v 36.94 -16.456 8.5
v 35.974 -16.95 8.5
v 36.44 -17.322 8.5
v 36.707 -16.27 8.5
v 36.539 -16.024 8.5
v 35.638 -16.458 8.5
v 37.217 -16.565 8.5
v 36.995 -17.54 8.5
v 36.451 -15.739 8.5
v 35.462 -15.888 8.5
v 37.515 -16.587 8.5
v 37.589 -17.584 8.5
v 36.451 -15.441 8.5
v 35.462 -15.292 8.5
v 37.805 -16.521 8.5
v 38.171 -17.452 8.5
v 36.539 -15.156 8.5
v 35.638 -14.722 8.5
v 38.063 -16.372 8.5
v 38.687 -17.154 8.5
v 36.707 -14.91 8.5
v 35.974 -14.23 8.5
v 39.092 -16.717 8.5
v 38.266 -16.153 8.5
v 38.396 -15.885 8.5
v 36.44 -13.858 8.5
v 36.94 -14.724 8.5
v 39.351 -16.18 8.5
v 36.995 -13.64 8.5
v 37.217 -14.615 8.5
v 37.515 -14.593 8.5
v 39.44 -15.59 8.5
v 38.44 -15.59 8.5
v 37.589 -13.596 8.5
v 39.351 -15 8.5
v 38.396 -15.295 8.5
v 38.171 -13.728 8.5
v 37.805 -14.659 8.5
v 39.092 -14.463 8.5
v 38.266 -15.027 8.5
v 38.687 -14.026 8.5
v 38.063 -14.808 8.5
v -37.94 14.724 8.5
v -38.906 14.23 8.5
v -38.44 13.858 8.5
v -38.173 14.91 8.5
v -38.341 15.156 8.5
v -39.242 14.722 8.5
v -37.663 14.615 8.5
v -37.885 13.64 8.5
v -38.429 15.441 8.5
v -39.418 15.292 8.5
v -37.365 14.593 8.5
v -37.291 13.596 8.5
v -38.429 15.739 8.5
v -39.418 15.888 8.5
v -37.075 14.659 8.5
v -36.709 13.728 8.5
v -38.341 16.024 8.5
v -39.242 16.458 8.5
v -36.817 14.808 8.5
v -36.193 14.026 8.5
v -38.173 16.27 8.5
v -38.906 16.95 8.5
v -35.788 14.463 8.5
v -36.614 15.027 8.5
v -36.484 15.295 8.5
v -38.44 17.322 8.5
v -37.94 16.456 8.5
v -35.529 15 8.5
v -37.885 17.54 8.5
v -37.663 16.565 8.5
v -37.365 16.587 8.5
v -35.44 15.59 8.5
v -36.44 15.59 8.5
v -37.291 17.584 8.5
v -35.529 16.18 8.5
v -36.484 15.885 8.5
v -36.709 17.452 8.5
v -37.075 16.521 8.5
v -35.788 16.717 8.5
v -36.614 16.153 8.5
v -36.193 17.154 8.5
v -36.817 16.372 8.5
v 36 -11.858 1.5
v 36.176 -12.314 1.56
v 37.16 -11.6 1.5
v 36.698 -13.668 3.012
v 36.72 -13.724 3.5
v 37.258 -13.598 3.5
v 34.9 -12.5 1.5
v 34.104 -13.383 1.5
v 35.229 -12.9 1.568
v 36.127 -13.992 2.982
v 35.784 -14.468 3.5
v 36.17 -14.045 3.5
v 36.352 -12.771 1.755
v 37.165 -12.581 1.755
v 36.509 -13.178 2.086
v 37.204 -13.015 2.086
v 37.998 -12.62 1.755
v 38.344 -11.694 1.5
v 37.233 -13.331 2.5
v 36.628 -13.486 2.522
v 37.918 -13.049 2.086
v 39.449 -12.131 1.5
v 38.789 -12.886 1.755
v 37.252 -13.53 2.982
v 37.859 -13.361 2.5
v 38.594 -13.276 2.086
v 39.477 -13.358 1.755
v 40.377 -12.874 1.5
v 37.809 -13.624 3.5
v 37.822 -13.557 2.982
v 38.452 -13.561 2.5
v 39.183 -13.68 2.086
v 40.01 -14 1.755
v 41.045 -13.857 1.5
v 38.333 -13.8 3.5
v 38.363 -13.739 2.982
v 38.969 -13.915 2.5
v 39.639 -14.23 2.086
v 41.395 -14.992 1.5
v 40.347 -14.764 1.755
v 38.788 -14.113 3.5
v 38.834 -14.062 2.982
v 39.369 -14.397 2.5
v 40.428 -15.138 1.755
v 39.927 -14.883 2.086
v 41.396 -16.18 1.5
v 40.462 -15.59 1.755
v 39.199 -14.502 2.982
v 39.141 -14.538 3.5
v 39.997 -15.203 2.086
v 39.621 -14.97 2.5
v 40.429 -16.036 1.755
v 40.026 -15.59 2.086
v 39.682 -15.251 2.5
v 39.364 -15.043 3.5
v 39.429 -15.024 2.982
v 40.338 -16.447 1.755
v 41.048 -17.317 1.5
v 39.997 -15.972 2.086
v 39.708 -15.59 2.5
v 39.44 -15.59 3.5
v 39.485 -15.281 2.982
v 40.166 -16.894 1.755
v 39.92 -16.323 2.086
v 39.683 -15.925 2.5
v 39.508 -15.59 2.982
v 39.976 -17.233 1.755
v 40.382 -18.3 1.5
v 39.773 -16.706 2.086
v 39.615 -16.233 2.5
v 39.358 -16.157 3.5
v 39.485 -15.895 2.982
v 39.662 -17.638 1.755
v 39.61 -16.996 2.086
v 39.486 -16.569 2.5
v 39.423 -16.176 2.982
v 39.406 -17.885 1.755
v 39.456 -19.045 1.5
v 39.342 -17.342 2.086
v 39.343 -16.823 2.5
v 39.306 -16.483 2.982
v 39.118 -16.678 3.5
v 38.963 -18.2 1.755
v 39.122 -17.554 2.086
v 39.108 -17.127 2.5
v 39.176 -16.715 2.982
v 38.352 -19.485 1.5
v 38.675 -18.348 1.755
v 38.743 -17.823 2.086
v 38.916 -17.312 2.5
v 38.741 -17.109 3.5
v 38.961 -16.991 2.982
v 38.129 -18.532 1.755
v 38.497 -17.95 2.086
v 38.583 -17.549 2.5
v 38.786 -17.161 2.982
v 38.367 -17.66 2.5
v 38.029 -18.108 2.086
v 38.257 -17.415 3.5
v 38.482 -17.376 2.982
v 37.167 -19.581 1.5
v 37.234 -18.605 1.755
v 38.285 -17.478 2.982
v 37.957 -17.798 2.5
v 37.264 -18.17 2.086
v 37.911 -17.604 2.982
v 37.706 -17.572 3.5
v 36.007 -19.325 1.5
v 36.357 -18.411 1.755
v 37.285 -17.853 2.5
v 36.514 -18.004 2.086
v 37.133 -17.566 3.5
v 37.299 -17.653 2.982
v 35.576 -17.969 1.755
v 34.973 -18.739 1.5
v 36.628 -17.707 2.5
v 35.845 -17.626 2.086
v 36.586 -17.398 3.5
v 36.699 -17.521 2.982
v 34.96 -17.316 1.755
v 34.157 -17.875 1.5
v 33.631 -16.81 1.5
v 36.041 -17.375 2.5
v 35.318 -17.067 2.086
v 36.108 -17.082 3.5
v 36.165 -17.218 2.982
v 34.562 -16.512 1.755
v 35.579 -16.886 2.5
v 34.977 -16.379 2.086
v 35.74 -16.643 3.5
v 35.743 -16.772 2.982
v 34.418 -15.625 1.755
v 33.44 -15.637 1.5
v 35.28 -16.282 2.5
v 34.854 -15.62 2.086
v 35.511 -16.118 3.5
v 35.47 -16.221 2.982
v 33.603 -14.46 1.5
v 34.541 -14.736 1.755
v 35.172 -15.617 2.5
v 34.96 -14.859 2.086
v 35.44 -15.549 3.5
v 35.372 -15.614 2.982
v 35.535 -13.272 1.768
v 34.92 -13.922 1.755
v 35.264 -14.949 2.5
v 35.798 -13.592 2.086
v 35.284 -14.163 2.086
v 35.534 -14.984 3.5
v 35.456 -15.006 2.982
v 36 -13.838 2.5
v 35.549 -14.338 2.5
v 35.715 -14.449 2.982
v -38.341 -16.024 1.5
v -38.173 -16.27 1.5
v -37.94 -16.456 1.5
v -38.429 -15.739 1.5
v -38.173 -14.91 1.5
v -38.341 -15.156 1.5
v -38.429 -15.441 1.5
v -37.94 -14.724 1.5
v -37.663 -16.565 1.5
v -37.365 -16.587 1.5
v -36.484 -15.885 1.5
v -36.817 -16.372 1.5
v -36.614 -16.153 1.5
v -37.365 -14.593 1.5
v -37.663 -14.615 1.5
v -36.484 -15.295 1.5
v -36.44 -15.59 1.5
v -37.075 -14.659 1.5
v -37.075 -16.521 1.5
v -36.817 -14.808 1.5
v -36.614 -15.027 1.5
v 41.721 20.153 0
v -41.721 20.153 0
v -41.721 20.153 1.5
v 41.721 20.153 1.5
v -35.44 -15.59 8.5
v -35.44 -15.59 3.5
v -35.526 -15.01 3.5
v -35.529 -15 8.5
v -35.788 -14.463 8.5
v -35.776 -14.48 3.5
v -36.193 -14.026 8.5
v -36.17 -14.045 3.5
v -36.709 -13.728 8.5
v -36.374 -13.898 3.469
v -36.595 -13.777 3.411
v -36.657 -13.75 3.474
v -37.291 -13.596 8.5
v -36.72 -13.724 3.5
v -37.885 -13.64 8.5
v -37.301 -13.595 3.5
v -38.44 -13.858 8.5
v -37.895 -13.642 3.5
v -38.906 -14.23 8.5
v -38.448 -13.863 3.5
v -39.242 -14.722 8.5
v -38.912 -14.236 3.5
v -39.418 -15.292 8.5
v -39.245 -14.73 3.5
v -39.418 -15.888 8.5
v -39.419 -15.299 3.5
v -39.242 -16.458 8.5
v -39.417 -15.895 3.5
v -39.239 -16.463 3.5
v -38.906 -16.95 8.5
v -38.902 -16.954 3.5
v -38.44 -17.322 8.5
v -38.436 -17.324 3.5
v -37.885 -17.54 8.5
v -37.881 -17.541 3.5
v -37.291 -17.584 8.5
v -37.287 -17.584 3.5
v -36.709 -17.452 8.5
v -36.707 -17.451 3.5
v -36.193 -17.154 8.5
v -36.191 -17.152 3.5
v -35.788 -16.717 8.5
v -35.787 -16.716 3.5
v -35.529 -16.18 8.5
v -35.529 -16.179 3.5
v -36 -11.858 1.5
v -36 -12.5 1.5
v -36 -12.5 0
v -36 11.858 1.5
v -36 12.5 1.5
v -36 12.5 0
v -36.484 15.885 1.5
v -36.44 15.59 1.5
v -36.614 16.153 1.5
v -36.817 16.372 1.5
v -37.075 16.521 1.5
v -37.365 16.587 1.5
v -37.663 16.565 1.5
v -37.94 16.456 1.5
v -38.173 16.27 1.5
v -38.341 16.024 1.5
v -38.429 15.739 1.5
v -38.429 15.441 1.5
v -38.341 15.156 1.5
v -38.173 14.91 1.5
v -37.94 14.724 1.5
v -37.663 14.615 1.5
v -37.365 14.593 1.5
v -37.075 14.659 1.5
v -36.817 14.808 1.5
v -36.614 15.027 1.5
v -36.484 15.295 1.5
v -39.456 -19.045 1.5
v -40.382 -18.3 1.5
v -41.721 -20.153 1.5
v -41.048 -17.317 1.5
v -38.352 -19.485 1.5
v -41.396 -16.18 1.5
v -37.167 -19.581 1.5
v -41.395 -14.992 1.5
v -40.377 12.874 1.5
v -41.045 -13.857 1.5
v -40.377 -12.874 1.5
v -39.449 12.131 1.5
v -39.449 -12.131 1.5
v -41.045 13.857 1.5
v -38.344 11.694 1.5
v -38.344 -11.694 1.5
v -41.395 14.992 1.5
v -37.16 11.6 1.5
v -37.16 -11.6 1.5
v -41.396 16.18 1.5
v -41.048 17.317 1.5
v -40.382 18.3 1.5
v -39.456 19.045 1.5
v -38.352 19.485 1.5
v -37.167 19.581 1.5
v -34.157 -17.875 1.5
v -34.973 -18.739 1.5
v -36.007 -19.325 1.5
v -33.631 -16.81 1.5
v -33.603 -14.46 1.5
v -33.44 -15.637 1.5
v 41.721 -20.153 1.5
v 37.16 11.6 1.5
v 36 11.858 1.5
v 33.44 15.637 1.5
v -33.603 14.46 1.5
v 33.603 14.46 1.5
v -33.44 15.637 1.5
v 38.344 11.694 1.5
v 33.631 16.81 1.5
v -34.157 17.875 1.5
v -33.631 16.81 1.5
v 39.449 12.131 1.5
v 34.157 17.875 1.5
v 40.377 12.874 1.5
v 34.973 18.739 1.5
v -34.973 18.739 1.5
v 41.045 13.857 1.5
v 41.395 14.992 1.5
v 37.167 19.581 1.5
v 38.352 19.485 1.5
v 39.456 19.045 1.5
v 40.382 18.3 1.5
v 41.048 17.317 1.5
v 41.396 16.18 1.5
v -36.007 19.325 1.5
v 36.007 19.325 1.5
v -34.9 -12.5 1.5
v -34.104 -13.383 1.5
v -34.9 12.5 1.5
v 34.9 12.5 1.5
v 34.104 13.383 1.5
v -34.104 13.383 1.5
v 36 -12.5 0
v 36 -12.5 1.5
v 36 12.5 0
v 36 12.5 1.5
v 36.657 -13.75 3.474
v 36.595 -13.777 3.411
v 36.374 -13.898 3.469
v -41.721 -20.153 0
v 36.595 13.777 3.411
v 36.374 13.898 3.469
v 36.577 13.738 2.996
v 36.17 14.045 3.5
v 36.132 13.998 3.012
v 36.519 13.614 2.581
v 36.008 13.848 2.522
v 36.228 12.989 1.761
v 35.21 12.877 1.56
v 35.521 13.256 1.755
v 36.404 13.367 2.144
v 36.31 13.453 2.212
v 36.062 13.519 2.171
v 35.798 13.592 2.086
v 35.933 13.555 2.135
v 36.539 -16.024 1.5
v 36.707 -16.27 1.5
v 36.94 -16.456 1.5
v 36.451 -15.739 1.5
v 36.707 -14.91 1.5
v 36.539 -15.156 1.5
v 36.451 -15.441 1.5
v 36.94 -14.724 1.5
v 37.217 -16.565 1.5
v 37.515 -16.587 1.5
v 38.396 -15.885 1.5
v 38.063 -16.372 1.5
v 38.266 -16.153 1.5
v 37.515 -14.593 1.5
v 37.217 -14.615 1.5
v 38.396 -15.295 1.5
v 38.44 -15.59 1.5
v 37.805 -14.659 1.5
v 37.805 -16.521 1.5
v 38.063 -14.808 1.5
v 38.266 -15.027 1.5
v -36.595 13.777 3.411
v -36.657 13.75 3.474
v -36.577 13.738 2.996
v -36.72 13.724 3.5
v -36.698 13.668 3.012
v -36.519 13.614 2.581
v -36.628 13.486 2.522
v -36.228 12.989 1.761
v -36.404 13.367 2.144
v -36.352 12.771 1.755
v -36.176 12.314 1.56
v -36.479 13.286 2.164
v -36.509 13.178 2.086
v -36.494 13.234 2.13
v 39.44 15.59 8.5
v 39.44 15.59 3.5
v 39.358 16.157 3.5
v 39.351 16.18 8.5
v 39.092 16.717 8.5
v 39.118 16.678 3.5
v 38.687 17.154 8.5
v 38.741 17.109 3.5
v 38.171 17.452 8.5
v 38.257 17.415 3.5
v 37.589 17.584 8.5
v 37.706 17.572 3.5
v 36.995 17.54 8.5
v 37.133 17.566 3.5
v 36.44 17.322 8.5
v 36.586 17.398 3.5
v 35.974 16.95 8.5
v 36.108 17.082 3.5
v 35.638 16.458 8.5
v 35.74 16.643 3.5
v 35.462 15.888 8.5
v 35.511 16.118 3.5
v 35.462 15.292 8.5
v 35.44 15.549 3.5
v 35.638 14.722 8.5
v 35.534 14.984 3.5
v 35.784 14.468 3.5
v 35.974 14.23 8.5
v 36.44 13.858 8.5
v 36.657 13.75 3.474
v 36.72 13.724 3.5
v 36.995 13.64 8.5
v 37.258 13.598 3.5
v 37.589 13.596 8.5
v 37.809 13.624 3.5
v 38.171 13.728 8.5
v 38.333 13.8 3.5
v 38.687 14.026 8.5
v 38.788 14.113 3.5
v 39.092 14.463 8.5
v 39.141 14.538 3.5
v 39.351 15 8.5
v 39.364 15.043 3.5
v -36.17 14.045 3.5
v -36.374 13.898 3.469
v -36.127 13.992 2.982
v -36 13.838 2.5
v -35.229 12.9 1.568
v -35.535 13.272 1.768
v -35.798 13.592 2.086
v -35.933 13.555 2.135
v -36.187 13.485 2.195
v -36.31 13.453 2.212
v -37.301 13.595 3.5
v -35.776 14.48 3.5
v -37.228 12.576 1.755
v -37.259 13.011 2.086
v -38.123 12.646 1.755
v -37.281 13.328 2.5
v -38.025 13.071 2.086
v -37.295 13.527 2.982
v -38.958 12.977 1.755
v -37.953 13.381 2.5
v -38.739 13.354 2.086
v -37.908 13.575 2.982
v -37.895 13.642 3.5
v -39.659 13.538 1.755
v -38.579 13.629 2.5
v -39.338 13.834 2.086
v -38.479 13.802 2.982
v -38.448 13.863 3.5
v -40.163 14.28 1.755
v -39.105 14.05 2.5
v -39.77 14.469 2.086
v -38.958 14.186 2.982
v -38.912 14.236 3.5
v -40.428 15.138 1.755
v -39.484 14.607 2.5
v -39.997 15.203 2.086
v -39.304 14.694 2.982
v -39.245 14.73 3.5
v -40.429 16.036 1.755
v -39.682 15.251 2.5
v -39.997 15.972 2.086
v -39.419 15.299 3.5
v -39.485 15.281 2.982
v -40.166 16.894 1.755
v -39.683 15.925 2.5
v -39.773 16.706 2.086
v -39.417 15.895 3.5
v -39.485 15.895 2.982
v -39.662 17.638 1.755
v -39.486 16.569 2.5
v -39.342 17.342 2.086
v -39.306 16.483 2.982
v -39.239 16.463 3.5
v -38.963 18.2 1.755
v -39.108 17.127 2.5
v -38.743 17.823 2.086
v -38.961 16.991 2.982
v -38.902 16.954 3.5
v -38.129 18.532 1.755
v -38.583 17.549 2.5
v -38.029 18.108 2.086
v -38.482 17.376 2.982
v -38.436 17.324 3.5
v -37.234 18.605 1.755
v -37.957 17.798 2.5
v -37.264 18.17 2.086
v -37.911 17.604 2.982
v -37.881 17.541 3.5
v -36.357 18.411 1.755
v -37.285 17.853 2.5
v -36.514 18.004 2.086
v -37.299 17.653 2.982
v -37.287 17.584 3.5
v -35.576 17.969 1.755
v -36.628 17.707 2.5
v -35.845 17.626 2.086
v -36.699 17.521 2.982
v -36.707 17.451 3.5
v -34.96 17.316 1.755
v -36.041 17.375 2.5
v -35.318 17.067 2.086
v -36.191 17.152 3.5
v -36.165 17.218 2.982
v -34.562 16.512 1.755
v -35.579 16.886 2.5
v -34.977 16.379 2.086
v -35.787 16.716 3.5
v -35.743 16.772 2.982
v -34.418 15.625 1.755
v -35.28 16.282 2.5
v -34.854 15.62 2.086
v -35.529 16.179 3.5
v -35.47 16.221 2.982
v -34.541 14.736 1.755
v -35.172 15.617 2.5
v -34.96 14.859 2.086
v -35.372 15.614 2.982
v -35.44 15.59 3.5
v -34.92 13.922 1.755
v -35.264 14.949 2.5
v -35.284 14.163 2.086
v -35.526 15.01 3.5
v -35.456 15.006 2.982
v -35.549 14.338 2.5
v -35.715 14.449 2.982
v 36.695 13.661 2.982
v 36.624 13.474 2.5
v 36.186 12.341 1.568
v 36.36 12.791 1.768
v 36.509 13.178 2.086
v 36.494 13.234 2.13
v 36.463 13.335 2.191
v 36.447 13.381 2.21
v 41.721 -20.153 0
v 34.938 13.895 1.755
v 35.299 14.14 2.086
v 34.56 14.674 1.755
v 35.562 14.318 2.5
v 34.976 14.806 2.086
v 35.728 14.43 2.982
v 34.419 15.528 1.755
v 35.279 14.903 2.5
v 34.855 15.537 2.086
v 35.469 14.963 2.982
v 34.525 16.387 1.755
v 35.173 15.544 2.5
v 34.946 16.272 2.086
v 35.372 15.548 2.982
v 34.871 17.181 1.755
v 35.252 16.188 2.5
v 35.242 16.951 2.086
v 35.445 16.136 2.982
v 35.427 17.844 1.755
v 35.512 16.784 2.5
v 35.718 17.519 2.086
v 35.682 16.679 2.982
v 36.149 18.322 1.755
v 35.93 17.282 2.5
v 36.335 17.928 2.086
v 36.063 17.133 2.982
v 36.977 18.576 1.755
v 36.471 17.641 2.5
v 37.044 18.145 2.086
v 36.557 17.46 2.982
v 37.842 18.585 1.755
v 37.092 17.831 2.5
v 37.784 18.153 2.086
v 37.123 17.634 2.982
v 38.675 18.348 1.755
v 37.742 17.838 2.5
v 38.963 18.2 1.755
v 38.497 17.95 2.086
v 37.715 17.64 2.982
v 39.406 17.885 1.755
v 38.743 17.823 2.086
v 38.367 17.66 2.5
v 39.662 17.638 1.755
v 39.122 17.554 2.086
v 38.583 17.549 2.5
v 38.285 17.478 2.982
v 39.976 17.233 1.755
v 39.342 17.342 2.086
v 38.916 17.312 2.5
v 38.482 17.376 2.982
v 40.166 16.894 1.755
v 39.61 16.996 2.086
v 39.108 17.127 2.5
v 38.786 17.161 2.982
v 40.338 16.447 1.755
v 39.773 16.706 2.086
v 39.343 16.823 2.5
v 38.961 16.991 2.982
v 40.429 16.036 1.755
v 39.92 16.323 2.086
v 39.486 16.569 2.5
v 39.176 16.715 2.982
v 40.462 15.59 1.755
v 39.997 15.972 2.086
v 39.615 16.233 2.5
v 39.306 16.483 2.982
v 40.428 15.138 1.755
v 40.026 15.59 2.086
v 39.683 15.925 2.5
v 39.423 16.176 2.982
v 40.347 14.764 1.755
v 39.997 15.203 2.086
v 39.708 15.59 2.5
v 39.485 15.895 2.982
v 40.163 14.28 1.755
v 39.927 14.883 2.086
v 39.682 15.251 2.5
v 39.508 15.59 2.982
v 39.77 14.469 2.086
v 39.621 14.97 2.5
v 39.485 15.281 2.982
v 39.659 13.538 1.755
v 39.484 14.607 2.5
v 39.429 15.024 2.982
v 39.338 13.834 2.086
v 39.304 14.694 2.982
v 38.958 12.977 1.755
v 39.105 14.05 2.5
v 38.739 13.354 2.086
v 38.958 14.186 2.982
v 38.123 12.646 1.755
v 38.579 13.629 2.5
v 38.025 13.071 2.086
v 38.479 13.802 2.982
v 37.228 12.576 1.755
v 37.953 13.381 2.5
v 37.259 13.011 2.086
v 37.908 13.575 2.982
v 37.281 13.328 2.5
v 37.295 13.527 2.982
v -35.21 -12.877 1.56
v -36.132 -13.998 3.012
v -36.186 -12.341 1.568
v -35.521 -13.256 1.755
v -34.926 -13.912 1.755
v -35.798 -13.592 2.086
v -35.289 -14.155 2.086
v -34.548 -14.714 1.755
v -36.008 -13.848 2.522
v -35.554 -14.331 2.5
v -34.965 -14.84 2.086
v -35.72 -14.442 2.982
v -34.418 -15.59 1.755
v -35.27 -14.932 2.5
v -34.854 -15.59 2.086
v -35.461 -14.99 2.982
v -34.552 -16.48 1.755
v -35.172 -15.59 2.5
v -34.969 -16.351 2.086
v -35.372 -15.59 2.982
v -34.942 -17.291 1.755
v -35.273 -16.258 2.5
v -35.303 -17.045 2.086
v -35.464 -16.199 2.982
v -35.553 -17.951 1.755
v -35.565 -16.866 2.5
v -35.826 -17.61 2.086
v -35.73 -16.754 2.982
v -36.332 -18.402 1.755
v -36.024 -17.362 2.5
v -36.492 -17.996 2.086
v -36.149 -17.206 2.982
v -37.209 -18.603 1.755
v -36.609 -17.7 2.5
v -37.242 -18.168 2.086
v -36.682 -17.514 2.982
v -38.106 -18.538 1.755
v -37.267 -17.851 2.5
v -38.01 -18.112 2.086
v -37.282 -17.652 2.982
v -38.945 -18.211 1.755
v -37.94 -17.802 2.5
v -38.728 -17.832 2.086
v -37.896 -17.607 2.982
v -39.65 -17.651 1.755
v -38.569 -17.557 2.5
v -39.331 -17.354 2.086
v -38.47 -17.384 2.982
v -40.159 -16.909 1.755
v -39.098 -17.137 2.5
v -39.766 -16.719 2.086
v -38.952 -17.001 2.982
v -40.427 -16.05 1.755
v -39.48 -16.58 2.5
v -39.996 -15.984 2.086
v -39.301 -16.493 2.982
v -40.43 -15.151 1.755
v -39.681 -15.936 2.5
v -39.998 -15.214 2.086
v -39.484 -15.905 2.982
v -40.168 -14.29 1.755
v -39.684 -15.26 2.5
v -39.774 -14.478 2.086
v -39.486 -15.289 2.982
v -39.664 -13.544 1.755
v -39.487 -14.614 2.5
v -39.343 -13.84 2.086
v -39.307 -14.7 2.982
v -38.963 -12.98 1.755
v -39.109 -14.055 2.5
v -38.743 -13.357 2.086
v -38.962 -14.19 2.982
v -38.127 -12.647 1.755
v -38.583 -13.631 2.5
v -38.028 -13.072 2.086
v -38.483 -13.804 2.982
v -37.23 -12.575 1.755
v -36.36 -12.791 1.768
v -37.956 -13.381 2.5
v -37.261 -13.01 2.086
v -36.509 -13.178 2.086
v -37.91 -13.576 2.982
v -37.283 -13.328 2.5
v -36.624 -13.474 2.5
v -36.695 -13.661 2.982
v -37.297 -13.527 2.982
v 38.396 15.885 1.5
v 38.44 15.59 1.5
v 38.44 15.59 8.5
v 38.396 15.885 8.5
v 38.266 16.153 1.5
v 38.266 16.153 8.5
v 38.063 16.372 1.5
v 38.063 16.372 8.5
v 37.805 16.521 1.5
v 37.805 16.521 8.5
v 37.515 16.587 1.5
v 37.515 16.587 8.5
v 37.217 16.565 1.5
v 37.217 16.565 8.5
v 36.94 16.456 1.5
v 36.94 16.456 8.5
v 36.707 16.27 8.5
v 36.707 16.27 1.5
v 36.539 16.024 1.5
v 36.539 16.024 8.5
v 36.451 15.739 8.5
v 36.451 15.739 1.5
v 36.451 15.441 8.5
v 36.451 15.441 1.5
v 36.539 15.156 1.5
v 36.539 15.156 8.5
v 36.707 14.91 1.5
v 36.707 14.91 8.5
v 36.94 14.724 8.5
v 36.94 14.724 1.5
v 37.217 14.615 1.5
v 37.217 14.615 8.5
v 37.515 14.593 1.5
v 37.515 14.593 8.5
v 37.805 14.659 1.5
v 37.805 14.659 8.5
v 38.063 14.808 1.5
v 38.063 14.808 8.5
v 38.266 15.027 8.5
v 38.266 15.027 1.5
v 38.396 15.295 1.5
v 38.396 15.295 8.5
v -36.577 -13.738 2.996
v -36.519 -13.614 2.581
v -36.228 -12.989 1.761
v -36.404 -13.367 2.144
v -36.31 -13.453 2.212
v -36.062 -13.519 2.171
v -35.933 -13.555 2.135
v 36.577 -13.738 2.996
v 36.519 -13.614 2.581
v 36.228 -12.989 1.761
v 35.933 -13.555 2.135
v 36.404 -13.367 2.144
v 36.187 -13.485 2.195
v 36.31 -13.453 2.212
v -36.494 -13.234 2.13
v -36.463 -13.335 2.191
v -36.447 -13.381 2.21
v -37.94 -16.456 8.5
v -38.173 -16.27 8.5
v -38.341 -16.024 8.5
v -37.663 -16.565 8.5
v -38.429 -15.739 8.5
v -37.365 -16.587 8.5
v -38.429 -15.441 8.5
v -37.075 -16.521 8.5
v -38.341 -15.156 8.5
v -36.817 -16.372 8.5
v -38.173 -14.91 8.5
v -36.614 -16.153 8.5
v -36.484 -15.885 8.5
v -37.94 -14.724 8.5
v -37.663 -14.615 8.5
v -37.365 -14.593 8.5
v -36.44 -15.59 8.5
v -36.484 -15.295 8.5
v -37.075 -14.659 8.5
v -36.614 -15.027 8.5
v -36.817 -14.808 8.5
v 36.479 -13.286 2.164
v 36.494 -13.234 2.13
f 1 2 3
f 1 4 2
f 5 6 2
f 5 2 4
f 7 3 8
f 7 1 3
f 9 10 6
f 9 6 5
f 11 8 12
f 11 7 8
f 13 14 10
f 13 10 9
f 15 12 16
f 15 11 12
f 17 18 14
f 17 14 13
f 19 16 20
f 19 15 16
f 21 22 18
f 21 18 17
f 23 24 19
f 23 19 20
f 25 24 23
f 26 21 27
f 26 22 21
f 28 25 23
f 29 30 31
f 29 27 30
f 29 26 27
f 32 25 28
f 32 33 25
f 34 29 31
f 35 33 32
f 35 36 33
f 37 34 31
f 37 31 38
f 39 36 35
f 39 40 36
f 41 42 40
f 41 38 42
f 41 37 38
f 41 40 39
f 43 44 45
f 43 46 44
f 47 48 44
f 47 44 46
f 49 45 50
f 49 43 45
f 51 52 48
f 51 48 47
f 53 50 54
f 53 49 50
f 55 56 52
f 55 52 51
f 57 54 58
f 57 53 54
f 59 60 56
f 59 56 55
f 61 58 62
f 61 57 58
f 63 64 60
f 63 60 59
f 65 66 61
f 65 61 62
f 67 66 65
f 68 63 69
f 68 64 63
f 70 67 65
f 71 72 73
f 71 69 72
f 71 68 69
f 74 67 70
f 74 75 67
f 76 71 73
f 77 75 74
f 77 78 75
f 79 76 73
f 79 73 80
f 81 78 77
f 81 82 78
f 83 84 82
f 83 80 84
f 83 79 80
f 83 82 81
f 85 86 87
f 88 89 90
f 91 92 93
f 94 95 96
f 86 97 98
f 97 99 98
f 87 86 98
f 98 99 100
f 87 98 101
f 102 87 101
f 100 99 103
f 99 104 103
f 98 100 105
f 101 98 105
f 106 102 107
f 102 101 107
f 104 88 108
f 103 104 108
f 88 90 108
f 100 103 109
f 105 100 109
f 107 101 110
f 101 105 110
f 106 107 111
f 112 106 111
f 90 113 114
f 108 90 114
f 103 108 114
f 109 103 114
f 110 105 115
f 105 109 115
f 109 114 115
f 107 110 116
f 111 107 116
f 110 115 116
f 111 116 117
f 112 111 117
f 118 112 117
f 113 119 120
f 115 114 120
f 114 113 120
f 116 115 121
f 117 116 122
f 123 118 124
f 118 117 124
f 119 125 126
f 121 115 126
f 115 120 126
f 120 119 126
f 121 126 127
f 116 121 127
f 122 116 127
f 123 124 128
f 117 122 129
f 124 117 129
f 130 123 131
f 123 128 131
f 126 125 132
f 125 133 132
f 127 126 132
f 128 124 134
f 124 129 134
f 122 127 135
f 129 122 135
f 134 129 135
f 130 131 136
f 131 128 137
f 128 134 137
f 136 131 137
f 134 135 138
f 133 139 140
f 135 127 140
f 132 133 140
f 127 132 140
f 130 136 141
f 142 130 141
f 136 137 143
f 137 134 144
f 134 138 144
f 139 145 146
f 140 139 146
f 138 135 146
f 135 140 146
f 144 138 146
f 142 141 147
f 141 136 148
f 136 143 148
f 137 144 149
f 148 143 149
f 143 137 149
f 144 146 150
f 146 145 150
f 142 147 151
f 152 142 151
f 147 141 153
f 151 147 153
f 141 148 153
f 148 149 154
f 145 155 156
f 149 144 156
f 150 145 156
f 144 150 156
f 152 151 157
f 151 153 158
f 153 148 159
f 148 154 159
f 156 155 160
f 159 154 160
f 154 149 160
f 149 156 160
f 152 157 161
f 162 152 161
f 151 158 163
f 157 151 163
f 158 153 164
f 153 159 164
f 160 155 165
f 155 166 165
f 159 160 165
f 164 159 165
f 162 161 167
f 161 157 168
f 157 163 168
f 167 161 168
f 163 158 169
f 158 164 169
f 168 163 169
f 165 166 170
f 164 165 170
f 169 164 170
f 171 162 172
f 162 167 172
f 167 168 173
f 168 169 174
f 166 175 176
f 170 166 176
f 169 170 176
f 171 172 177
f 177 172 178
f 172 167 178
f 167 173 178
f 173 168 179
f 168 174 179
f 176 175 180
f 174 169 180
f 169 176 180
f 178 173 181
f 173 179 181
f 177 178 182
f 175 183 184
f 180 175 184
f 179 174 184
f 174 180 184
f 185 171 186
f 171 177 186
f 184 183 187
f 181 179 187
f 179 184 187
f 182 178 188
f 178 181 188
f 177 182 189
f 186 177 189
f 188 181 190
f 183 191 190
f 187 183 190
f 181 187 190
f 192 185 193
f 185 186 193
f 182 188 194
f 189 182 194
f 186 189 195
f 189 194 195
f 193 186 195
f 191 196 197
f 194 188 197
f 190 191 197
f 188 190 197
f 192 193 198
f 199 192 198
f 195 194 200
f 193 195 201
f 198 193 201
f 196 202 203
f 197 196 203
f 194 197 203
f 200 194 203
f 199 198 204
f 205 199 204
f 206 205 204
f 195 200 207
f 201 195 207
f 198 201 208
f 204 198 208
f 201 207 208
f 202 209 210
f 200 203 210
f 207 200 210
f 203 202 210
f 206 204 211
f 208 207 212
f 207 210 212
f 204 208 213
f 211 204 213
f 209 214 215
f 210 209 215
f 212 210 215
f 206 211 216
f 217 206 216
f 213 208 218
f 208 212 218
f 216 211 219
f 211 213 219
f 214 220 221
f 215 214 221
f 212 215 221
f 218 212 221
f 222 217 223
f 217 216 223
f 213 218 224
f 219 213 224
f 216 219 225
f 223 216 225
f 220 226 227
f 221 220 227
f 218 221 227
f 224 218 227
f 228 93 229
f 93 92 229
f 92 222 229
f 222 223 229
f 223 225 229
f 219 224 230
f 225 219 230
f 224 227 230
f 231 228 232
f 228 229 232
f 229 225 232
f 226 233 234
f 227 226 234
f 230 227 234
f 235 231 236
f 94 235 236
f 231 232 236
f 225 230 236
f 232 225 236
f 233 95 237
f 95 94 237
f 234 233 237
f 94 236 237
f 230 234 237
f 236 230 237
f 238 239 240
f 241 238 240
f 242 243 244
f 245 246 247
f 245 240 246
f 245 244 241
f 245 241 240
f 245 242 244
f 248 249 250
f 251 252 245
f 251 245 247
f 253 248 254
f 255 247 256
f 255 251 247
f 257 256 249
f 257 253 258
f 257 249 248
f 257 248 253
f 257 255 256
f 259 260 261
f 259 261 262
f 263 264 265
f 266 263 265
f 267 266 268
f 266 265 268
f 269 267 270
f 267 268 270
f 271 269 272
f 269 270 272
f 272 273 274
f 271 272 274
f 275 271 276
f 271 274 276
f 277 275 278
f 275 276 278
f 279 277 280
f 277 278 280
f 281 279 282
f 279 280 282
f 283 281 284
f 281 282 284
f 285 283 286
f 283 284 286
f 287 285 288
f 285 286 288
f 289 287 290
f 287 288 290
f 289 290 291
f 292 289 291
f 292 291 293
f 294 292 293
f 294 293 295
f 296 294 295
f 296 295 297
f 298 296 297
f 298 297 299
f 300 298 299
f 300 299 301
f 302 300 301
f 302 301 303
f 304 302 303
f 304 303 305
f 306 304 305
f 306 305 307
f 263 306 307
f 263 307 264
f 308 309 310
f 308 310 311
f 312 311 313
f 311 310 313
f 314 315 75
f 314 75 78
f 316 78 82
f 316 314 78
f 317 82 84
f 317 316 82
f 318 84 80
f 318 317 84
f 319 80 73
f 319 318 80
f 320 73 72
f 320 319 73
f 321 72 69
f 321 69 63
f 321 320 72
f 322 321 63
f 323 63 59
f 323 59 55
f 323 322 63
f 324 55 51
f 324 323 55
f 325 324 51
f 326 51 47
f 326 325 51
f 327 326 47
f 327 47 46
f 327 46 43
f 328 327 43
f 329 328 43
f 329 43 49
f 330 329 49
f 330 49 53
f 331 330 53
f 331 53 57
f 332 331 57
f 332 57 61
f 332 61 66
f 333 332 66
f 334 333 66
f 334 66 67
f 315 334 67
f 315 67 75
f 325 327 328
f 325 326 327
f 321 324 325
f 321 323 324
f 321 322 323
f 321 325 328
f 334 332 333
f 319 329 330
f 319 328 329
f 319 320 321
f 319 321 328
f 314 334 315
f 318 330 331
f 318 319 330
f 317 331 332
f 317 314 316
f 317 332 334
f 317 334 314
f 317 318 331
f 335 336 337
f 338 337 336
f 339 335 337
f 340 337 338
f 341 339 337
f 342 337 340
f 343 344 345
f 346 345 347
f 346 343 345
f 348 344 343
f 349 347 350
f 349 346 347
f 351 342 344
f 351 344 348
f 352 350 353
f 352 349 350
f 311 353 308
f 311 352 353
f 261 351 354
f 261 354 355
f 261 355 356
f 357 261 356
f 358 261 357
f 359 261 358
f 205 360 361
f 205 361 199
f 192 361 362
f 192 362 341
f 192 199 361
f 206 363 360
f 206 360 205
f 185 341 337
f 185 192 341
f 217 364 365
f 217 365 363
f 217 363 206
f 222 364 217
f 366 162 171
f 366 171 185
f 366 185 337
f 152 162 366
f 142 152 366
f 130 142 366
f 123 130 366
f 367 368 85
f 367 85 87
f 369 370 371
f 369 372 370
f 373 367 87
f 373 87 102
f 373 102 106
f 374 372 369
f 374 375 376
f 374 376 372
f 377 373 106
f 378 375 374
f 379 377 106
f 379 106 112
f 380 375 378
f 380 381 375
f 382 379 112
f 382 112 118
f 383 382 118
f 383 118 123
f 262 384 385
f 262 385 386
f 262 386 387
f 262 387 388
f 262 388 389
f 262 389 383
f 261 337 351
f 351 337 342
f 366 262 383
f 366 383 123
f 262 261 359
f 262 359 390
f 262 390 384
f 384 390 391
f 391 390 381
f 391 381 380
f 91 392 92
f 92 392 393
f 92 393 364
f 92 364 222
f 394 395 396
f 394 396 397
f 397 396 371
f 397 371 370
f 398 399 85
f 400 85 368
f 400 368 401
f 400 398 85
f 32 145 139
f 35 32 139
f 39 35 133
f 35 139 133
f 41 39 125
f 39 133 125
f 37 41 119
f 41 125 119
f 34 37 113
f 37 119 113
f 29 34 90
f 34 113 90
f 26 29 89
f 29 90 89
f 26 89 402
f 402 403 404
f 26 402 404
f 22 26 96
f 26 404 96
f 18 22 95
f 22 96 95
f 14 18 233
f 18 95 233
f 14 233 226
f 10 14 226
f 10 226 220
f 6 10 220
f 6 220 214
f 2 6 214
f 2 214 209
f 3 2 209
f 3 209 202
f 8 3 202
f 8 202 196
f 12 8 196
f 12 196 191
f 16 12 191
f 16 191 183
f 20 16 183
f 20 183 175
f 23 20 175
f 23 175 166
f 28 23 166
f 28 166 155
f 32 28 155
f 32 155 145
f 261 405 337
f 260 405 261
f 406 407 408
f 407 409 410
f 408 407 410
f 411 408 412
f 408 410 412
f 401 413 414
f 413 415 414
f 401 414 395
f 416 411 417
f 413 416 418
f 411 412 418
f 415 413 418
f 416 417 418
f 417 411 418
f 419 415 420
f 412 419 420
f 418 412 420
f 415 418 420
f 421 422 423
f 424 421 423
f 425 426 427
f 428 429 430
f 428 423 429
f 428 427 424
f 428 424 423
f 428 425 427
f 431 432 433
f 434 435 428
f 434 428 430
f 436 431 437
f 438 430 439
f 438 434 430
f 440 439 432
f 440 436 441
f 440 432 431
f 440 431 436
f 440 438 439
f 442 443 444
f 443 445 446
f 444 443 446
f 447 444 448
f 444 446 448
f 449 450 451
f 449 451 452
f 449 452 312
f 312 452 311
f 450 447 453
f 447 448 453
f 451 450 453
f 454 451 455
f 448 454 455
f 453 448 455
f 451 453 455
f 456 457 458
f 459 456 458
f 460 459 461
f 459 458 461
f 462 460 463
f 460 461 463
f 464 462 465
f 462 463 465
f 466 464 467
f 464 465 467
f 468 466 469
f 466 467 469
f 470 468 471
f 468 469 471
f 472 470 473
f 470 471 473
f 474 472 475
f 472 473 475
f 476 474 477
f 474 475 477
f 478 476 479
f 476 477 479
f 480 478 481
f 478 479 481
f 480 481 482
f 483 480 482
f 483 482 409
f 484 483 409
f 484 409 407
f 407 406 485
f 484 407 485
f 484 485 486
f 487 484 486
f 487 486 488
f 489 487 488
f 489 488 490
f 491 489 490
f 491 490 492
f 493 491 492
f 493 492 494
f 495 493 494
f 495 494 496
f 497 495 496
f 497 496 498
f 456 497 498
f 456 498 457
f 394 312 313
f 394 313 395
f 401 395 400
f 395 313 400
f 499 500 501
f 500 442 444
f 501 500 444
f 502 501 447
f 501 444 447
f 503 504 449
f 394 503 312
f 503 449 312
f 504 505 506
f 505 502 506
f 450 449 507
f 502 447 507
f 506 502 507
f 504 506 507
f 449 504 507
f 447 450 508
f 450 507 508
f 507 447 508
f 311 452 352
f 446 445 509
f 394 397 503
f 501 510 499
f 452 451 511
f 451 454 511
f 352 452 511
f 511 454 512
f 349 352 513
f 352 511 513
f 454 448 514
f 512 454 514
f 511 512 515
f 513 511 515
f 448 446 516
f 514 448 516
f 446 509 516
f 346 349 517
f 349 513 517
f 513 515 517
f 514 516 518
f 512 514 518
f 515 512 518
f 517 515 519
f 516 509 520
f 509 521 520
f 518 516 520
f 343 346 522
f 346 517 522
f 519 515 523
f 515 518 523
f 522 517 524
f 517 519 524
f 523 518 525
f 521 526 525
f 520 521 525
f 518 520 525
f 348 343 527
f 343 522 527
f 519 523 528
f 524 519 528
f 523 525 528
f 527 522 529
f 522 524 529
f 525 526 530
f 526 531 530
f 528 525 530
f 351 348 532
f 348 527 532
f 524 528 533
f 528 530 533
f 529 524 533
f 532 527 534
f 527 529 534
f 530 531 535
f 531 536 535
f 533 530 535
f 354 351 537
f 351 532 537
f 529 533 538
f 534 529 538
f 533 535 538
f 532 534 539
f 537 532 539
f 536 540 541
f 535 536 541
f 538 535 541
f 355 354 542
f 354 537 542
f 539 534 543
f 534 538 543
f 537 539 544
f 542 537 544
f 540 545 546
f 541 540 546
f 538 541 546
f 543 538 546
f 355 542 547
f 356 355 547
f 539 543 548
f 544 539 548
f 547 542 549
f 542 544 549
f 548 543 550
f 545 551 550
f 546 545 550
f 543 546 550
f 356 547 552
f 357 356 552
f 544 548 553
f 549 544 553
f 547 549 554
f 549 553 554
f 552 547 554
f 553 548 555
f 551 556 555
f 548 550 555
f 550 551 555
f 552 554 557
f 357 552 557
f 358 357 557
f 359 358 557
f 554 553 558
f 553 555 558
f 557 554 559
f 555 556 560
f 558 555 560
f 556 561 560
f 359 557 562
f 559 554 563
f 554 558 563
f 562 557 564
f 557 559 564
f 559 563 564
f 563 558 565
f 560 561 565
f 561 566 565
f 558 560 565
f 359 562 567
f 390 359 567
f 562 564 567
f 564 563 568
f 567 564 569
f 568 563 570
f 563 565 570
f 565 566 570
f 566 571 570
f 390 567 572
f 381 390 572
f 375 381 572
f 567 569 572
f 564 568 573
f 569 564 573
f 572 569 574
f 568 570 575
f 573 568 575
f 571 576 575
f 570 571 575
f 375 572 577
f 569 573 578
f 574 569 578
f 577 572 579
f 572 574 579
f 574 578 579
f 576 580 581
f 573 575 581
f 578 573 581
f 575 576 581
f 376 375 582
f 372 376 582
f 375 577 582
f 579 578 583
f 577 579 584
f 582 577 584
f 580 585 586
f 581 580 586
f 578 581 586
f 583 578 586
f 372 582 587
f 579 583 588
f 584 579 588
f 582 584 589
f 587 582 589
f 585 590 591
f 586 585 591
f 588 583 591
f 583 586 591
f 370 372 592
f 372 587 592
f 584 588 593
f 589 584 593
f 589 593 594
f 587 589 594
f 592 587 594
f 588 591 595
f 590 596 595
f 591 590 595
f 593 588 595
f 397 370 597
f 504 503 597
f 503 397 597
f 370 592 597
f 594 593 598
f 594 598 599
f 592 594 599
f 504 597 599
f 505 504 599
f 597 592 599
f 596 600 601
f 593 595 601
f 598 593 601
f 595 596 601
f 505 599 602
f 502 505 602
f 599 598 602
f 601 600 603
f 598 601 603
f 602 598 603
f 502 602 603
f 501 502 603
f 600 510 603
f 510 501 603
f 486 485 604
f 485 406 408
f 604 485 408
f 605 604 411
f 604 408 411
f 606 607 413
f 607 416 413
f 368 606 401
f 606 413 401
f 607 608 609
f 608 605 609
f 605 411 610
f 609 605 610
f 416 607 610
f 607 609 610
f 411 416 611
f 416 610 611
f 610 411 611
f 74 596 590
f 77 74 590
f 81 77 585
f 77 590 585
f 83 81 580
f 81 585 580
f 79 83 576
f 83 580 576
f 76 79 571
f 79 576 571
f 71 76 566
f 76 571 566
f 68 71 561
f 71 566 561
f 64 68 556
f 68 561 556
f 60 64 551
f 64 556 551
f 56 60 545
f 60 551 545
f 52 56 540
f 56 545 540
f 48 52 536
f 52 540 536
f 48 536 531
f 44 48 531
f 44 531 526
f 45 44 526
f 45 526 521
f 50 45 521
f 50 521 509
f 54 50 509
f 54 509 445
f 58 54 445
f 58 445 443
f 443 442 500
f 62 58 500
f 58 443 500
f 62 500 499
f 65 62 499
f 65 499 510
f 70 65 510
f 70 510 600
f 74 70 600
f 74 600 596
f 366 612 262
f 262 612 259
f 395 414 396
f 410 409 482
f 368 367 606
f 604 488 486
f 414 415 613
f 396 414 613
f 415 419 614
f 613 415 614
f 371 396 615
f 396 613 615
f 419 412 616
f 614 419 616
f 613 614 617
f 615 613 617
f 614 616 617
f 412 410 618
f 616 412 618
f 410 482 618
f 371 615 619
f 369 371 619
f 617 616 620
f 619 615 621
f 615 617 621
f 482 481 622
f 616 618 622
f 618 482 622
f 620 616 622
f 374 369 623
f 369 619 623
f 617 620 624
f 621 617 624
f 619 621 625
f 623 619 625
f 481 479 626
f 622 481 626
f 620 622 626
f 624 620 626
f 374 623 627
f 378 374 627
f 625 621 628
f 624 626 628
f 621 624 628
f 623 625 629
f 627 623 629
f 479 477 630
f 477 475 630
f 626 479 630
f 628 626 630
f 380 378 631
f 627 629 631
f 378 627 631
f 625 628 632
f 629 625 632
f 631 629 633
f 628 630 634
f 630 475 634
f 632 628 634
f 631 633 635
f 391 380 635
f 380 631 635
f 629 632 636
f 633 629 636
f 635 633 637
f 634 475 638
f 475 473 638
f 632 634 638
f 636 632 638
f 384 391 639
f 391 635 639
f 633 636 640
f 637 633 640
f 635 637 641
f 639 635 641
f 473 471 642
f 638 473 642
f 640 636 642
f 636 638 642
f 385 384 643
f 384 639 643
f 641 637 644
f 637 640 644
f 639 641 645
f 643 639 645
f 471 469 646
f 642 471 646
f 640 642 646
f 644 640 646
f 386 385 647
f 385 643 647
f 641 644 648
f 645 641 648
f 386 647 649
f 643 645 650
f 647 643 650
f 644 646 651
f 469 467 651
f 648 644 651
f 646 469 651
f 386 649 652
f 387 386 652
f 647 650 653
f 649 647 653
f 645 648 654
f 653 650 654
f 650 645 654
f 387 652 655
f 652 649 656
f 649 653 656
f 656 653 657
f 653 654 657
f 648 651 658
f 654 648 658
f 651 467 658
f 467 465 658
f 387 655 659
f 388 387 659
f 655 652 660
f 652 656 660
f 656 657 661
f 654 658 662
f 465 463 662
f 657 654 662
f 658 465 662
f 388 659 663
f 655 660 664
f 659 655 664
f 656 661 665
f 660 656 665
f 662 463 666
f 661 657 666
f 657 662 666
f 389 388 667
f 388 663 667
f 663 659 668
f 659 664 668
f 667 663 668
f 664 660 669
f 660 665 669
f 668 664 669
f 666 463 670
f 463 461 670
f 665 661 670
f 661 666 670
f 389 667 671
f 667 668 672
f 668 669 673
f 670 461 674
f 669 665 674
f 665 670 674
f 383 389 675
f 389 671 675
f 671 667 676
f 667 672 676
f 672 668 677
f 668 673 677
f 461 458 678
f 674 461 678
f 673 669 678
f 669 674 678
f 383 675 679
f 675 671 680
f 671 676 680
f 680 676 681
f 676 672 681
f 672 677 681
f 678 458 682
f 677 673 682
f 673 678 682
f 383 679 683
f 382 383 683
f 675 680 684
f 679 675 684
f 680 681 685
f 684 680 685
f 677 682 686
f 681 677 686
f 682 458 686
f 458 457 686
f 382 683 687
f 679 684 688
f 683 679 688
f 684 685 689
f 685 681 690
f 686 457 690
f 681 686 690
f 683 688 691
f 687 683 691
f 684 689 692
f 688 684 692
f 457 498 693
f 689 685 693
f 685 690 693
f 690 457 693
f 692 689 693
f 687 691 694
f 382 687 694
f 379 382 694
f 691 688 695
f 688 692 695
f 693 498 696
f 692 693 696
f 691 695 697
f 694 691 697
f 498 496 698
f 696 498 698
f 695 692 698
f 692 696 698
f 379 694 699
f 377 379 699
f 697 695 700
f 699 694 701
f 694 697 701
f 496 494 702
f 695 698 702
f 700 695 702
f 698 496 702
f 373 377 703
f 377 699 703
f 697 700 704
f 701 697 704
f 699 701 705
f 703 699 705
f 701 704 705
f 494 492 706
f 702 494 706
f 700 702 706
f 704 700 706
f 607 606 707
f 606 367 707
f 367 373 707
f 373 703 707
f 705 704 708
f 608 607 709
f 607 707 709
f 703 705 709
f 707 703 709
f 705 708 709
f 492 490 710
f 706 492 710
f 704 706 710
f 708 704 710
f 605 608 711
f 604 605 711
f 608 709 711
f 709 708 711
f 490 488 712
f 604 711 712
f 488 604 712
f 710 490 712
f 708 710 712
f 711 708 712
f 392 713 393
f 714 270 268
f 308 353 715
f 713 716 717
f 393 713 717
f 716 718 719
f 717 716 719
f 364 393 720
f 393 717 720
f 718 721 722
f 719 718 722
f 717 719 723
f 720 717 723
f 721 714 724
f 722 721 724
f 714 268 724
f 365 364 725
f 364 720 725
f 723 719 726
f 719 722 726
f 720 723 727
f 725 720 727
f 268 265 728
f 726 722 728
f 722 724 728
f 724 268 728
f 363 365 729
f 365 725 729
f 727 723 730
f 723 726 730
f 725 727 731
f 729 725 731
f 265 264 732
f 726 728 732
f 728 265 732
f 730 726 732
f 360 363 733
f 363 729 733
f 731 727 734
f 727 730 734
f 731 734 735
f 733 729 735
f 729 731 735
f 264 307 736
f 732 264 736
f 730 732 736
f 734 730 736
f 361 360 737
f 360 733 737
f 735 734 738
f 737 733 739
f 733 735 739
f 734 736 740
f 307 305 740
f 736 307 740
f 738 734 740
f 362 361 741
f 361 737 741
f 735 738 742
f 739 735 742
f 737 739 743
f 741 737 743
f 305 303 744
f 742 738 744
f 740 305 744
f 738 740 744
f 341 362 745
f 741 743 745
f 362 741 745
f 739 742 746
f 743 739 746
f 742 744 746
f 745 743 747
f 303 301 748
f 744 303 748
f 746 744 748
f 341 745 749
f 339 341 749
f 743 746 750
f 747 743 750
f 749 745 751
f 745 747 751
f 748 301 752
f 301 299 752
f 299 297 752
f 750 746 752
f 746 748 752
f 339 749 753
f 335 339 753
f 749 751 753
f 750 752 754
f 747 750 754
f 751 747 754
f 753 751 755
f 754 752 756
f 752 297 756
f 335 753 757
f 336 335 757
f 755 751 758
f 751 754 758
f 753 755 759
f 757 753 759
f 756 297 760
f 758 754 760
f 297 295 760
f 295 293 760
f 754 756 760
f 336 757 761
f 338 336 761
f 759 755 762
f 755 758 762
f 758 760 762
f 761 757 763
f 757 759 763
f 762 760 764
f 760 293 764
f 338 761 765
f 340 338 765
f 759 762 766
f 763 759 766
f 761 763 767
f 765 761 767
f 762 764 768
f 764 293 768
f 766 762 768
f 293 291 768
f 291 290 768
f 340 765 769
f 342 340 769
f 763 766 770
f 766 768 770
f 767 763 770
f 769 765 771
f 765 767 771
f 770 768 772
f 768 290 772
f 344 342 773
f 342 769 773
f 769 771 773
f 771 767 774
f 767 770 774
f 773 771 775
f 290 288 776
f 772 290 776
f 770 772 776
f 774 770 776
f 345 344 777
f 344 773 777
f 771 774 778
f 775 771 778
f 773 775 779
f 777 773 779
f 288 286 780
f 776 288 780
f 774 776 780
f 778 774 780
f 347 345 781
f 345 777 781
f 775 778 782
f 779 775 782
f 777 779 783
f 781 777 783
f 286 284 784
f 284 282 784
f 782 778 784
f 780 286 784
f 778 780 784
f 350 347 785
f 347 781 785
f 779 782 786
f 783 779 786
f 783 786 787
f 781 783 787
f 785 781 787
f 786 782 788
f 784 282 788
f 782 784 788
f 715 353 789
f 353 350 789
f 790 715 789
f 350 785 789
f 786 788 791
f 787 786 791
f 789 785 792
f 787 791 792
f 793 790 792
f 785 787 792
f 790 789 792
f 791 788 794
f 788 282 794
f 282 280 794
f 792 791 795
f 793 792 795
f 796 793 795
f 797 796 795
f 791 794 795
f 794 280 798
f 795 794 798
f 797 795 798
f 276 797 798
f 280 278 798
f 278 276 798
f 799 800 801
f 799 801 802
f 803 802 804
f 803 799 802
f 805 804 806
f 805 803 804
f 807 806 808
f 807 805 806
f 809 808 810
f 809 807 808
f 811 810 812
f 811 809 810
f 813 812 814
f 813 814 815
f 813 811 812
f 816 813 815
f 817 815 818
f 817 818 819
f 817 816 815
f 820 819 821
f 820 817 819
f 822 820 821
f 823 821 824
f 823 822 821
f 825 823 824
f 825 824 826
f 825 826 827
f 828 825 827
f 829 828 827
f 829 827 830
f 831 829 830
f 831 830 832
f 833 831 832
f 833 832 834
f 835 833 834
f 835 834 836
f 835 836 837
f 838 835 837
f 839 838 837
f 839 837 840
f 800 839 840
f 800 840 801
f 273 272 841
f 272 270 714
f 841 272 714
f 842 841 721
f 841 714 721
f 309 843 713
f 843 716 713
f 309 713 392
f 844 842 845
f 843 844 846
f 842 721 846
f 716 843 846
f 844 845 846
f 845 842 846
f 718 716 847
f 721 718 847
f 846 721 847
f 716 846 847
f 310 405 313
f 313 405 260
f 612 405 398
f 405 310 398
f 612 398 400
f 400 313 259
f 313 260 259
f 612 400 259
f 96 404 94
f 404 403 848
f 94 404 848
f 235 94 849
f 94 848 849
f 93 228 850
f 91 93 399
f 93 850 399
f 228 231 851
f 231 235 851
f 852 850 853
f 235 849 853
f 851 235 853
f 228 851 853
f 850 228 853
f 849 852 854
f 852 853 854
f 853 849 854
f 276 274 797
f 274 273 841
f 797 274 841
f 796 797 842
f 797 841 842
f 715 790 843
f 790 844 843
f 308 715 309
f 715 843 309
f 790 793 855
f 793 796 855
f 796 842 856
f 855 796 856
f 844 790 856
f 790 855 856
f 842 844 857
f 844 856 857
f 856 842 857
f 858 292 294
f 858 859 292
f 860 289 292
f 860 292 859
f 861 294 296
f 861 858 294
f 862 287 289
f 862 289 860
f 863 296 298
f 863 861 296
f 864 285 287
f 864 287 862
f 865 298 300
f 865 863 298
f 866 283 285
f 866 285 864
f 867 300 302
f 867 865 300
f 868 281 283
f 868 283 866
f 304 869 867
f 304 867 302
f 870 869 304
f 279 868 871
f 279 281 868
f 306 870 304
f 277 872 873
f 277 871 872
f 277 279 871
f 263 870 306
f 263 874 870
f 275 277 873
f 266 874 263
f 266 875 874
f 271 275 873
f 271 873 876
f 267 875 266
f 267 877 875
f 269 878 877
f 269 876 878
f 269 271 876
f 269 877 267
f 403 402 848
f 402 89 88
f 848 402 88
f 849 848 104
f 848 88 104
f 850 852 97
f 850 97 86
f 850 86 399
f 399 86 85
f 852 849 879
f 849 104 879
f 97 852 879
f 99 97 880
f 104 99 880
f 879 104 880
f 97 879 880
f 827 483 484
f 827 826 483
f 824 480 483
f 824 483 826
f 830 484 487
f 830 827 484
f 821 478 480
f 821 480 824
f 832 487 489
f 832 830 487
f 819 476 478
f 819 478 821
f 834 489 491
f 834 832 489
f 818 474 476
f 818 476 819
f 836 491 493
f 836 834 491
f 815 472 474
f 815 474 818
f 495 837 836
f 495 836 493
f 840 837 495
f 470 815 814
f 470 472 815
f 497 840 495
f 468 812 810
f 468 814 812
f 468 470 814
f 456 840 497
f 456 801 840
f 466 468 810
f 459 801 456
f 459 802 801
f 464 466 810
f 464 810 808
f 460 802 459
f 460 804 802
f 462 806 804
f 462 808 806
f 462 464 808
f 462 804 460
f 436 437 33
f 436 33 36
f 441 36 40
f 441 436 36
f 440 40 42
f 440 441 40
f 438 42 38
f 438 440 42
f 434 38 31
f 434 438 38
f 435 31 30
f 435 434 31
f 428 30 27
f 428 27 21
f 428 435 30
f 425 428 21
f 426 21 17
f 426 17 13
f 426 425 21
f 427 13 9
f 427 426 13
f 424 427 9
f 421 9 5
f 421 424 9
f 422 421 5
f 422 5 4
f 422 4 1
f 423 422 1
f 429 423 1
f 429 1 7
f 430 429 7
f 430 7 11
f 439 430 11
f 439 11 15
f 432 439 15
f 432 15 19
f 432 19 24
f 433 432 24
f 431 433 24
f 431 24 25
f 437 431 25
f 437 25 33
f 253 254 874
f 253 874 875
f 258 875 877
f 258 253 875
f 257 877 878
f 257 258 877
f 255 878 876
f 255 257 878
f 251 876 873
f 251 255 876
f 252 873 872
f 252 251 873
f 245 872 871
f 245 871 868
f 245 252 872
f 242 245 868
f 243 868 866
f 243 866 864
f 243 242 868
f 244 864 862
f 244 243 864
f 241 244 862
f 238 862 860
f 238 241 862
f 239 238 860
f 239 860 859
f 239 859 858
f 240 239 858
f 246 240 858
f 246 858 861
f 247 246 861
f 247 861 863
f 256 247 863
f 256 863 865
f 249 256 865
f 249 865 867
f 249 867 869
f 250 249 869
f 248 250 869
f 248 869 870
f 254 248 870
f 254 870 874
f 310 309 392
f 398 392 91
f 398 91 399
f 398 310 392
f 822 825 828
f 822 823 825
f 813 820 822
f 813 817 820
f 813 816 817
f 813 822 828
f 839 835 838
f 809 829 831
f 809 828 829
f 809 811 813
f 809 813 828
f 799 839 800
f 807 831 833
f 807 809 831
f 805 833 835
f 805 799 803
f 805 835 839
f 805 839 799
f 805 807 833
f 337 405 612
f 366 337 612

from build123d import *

# Parameters (mm, degrees)
SKETCH_W      = 83.442268
SKETCH_H      = 40.305008
SKETCH_W_2    = 72
SKETCH_H_2    = 25
PAD_DEPTH     = 1.5
SKETCH001_R   = 2
SKETCH001_R_2 = 1
PAD001_DEPTH  = 8.5
FILLET_R      = 2


with BuildPart() as part:
    # Sketch → Pad (new body)
    with BuildSketch(Plane.XY):
        Rectangle(SKETCH_W, SKETCH_H)
        Rectangle(SKETCH_W_2, SKETCH_H_2, mode=Mode.SUBTRACT)
    extrude(amount=PAD_DEPTH)

    # Sketch001 → Pad001 (join)
    with BuildSketch(Plane.XY):
        with Locations((-37.44, 15.59)):
            Circle(SKETCH001_R)
        with Locations((-37.44, 15.59)):
            Circle(SKETCH001_R_2, mode=Mode.SUBTRACT)
        with Locations((-37.44, -15.59)):
            Circle(SKETCH001_R)
        with Locations((-37.44, -15.59)):
            Circle(SKETCH001_R_2, mode=Mode.SUBTRACT)
        with Locations((37.44, -15.59)):
            Circle(SKETCH001_R)
        with Locations((37.44, -15.59)):
            Circle(SKETCH001_R_2, mode=Mode.SUBTRACT)
        with Locations((37.44, 15.59)):
            Circle(SKETCH001_R)
        with Locations((37.44, 15.59)):
            Circle(SKETCH001_R_2, mode=Mode.SUBTRACT)
    extrude(amount=PAD001_DEPTH)

    # Fillet
    fillet_edges = [part.edges().sort_by_distance(p)[0] for p in [
        (-39.44, 15.59, 1.5),
        (35.44, 15.59, 1.5),
        (35.44, -15.59, 1.5),
        (-39.44, -15.59, 1.5),
    ]]
    fillet(fillet_edges, radius=FILLET_R)


solid = part.part
